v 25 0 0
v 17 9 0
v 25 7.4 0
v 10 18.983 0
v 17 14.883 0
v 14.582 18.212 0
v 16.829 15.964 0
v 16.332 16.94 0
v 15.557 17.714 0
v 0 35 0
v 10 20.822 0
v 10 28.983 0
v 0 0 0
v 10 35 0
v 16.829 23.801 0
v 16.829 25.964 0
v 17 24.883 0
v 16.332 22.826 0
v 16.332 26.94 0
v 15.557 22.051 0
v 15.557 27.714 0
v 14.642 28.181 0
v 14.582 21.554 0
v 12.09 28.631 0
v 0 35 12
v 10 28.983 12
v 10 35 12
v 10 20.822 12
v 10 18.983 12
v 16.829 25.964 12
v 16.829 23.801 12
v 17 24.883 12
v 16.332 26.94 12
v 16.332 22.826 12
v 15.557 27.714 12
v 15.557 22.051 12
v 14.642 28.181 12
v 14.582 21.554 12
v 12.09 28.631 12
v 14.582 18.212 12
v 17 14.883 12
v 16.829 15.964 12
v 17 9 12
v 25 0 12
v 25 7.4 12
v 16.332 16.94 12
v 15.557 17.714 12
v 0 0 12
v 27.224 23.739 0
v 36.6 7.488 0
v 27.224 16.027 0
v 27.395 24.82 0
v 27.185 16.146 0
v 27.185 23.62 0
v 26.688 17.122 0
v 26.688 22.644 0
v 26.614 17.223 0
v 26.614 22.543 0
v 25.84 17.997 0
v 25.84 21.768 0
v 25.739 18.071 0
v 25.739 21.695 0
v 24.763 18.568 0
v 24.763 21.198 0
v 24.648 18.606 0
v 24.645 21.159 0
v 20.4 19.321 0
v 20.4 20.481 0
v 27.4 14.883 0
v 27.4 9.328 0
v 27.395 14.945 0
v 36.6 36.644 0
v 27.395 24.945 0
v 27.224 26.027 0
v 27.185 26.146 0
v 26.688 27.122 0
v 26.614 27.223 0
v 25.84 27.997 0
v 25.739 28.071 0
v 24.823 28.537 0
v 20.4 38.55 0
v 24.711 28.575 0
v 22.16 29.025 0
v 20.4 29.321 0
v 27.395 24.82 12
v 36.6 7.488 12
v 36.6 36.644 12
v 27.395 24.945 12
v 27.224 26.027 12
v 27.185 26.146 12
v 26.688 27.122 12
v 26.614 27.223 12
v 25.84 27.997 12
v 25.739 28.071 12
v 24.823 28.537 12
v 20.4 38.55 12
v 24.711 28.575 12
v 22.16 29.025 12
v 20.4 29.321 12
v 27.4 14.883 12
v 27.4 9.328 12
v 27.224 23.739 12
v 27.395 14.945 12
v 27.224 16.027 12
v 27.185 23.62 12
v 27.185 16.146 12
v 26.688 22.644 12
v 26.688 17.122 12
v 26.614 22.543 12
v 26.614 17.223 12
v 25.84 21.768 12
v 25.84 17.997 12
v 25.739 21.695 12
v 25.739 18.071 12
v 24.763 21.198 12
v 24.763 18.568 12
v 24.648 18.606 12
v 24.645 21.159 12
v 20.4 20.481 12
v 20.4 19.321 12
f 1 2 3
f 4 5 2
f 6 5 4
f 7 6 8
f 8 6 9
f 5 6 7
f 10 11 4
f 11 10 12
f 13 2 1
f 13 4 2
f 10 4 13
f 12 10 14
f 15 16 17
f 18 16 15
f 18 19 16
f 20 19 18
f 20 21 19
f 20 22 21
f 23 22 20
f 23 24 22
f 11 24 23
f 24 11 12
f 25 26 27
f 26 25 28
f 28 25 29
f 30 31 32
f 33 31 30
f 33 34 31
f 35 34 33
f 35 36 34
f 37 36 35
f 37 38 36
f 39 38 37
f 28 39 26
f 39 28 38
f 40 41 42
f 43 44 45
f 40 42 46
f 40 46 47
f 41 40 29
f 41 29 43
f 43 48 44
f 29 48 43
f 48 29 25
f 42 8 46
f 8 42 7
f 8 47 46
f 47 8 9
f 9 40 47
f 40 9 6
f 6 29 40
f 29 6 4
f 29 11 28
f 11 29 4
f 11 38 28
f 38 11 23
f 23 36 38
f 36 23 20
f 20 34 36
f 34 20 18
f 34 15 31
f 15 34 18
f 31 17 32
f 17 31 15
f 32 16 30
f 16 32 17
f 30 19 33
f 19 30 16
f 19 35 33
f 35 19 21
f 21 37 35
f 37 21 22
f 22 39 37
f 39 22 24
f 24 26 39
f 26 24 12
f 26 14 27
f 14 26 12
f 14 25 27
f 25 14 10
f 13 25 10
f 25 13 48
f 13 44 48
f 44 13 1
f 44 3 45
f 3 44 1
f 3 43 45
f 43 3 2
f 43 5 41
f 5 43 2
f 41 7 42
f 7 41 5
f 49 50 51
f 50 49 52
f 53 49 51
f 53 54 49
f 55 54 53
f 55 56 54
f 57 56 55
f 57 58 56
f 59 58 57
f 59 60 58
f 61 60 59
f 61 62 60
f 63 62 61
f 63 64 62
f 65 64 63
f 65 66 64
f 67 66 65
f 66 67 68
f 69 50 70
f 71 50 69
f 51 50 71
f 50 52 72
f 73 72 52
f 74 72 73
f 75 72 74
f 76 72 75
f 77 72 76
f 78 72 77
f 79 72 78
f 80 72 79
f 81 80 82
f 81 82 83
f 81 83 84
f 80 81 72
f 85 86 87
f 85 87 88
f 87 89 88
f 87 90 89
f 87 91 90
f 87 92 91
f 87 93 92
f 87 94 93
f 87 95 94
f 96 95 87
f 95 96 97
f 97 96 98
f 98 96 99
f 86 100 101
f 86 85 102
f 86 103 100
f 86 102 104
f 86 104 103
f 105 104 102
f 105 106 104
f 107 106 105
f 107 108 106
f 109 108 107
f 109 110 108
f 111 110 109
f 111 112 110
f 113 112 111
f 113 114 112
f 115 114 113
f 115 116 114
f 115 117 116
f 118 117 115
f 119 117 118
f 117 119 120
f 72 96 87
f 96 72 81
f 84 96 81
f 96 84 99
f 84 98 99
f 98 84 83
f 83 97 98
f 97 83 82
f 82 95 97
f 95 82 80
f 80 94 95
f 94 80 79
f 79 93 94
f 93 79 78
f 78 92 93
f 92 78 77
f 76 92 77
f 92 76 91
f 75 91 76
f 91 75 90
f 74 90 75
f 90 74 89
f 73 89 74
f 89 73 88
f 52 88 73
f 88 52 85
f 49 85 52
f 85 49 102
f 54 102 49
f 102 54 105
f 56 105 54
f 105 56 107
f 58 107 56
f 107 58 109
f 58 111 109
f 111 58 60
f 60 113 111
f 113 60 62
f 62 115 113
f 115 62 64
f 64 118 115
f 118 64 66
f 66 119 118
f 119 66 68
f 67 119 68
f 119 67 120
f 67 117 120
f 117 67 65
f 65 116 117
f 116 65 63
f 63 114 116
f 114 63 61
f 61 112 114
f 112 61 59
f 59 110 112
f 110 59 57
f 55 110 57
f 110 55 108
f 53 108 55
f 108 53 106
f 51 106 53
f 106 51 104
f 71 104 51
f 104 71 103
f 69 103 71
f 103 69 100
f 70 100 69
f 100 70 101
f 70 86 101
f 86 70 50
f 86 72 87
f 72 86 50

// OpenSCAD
// file: memory.scad
/* An earlier demonstration of the diagonal memory cell. For a full
   16x16 diagonal memory cell, see memory-cell-16.scad. This diagonal
   memory system is now obsolete. */

include <globs.scad>;

$fn = 20;

/** delta_y is how much a cell moves down for each cell across we move. */
delta_y  = memory_cell_pitch_x * tan(memory_slope);


/** Memory block - the shape which holds and releases a ball bearing. This is designed for a 6mm ball bearing - it will have to be redesigned if not. */
module memory_block()
{
  block_height = memory_cell_pitch_y - 8*cos(memory_slope);
  block_width = memory_cell_pitch_x - 1;
  difference() {
    // Outline/bounding box of the block
    polygon(points = [[0,0], [block_width, -delta_y],
		      [block_width, -delta_y-block_height], [0, -block_height]]);
    // Upper left chamber cut-out
    hull() {
      polygon(points = [[-0.1,-1], [1, -1.1*tan(memory_slope)-1],
			[1, 1.1*tan(memory_slope)-9],
			[-0.1, -1.1*tan(memory_slope)-9]]);
      translate([3.5,-3.5*tan(memory_slope)-4.5]) circle(d=7);
    }

    // Lower left chamber cut-out

    hull() {
      polygon(points = [[-0.1,-11], [1, -1.1*tan(memory_slope)-11],
			[1, -1.1*tan(memory_slope)-20],
			[-0.1, -1.1*tan(memory_slope)-20]]);
      polygon(points = [[-0.1,-20], [7, -7.1*tan(memory_slope)-20],
			[7, -7.1*tan(memory_slope)-22],
			[-0.1, -7.1*tan(memory_slope)-22]]);
      translate([3.5,-3.5*tan(memory_slope)-11-3.5]) circle(d=7);
    }

    // Right chamber cut out
    hull() {
      polygon(points = [[8,0],[memory_cell_pitch_x+0.1,0],[memory_cell_pitch_x+0.1,-block_height+1-delta_y],[8,-block_height+3.5-8*tan(memory_slope)+1]]);
      translate([11.5,-11.5*tan(memory_slope)-11-3.5]) circle(d=7);
    }
  } // end of difference
}

module horizontal_stop_bar()
{
  polygon(points = [[0,0],[7, -7*tan(memory_slope)],
		    [7, -7*tan(memory_slope)-1],[0,-1]]);
}

module vertical_stop_bar()
{
  polygon(points = [[0,0],[1, -1*tan(memory_slope)],
		    [1, -1*tan(memory_slope)-5.5],[0,-5.5]]);
}


/* ----------------- TEST SECTION ------------------------ */

/* Test objects */
for(x = [0:3]) {
  for(y = [0:3]) {
    translate([memory_cell_pitch_x * x,
	       -delta_y * x - memory_cell_pitch_y*y]) linear_extrude(height=6) memory_block();
  }
}
//  translate([5,-100,5]) cube([memory_cell_pitch_x - 1, 100,2]);

for(y = [0:3]) {
  translate([0,-8*0.5*(1+cos($t*360)) - y*memory_cell_pitch_y]) {
    color([1.0,0,0]) translate([8.5, -8.5*tan(memory_slope)]) linear_extrude(height=8) horizontal_stop_bar();
    color([0,1.0,0]) translate([15.5, -15.5*tan(memory_slope)-14]) linear_extrude(height=8) vertical_stop_bar();
  }
 }

/* Test balls */
translate([12,-25.5,3]) sphere(d=6);
// file: globs.scad
/* Global definitions for millihertz 5 */

ball_bearing_diameter = 6.28;

pipe_outer_diameter = 11;

/* All dimensions are in millimetres */
memory_slope = 10; // Degrees

/** Memory cell pitch - the horizontal and vertical distances between one row and the next. Memory is arranged so one column (y) make up one word. Words are laid out vertically. */
memory_cell_pitch_x = 16;
memory_cell_pitch_y = 28 * cos(memory_slope);

/* Number of bits used in the data. This must be 32. */
bits = 32;

/** Accumulator / subtractor unit. Pitch is the horizontal spacing between both input and output. */
accumulator_input_pitch = 22;

/** Frame */

frame_internal_width = 900;
frame_internal_height = 2200;

/** Frame will probably be 50mm angle iron */
frame_width = 50;
// main file
// A mould for pressing memory cells out of brass strip

include <globs.scad>;
use <memory.scad>;

shim_thickness = 0.4;

// Part 1 - base former

linear_extrude(height=12)
difference() {
  square([25,35]);
  translate([10,30]) memory_block();
  translate([17,9.0]) polygon(points=[[0,0], [10,-2], [10,18], [0,20]]);
  translate([10,29.0]) polygon(points=[[0,0], [17,-3], [17,8], [0,10]]);
}

// Part 2 - top former

linear_extrude(height=12)
offset(-shim_thickness)
union() {
  translate([20,30]) memory_block();
  translate([27,9.0]) polygon(points=[[0,0], [10,-2], [10,18], [0,20]]);
  translate([20,29.0]) polygon(points=[[0,0], [17,-3], [17,8], [0,10]]);
}
